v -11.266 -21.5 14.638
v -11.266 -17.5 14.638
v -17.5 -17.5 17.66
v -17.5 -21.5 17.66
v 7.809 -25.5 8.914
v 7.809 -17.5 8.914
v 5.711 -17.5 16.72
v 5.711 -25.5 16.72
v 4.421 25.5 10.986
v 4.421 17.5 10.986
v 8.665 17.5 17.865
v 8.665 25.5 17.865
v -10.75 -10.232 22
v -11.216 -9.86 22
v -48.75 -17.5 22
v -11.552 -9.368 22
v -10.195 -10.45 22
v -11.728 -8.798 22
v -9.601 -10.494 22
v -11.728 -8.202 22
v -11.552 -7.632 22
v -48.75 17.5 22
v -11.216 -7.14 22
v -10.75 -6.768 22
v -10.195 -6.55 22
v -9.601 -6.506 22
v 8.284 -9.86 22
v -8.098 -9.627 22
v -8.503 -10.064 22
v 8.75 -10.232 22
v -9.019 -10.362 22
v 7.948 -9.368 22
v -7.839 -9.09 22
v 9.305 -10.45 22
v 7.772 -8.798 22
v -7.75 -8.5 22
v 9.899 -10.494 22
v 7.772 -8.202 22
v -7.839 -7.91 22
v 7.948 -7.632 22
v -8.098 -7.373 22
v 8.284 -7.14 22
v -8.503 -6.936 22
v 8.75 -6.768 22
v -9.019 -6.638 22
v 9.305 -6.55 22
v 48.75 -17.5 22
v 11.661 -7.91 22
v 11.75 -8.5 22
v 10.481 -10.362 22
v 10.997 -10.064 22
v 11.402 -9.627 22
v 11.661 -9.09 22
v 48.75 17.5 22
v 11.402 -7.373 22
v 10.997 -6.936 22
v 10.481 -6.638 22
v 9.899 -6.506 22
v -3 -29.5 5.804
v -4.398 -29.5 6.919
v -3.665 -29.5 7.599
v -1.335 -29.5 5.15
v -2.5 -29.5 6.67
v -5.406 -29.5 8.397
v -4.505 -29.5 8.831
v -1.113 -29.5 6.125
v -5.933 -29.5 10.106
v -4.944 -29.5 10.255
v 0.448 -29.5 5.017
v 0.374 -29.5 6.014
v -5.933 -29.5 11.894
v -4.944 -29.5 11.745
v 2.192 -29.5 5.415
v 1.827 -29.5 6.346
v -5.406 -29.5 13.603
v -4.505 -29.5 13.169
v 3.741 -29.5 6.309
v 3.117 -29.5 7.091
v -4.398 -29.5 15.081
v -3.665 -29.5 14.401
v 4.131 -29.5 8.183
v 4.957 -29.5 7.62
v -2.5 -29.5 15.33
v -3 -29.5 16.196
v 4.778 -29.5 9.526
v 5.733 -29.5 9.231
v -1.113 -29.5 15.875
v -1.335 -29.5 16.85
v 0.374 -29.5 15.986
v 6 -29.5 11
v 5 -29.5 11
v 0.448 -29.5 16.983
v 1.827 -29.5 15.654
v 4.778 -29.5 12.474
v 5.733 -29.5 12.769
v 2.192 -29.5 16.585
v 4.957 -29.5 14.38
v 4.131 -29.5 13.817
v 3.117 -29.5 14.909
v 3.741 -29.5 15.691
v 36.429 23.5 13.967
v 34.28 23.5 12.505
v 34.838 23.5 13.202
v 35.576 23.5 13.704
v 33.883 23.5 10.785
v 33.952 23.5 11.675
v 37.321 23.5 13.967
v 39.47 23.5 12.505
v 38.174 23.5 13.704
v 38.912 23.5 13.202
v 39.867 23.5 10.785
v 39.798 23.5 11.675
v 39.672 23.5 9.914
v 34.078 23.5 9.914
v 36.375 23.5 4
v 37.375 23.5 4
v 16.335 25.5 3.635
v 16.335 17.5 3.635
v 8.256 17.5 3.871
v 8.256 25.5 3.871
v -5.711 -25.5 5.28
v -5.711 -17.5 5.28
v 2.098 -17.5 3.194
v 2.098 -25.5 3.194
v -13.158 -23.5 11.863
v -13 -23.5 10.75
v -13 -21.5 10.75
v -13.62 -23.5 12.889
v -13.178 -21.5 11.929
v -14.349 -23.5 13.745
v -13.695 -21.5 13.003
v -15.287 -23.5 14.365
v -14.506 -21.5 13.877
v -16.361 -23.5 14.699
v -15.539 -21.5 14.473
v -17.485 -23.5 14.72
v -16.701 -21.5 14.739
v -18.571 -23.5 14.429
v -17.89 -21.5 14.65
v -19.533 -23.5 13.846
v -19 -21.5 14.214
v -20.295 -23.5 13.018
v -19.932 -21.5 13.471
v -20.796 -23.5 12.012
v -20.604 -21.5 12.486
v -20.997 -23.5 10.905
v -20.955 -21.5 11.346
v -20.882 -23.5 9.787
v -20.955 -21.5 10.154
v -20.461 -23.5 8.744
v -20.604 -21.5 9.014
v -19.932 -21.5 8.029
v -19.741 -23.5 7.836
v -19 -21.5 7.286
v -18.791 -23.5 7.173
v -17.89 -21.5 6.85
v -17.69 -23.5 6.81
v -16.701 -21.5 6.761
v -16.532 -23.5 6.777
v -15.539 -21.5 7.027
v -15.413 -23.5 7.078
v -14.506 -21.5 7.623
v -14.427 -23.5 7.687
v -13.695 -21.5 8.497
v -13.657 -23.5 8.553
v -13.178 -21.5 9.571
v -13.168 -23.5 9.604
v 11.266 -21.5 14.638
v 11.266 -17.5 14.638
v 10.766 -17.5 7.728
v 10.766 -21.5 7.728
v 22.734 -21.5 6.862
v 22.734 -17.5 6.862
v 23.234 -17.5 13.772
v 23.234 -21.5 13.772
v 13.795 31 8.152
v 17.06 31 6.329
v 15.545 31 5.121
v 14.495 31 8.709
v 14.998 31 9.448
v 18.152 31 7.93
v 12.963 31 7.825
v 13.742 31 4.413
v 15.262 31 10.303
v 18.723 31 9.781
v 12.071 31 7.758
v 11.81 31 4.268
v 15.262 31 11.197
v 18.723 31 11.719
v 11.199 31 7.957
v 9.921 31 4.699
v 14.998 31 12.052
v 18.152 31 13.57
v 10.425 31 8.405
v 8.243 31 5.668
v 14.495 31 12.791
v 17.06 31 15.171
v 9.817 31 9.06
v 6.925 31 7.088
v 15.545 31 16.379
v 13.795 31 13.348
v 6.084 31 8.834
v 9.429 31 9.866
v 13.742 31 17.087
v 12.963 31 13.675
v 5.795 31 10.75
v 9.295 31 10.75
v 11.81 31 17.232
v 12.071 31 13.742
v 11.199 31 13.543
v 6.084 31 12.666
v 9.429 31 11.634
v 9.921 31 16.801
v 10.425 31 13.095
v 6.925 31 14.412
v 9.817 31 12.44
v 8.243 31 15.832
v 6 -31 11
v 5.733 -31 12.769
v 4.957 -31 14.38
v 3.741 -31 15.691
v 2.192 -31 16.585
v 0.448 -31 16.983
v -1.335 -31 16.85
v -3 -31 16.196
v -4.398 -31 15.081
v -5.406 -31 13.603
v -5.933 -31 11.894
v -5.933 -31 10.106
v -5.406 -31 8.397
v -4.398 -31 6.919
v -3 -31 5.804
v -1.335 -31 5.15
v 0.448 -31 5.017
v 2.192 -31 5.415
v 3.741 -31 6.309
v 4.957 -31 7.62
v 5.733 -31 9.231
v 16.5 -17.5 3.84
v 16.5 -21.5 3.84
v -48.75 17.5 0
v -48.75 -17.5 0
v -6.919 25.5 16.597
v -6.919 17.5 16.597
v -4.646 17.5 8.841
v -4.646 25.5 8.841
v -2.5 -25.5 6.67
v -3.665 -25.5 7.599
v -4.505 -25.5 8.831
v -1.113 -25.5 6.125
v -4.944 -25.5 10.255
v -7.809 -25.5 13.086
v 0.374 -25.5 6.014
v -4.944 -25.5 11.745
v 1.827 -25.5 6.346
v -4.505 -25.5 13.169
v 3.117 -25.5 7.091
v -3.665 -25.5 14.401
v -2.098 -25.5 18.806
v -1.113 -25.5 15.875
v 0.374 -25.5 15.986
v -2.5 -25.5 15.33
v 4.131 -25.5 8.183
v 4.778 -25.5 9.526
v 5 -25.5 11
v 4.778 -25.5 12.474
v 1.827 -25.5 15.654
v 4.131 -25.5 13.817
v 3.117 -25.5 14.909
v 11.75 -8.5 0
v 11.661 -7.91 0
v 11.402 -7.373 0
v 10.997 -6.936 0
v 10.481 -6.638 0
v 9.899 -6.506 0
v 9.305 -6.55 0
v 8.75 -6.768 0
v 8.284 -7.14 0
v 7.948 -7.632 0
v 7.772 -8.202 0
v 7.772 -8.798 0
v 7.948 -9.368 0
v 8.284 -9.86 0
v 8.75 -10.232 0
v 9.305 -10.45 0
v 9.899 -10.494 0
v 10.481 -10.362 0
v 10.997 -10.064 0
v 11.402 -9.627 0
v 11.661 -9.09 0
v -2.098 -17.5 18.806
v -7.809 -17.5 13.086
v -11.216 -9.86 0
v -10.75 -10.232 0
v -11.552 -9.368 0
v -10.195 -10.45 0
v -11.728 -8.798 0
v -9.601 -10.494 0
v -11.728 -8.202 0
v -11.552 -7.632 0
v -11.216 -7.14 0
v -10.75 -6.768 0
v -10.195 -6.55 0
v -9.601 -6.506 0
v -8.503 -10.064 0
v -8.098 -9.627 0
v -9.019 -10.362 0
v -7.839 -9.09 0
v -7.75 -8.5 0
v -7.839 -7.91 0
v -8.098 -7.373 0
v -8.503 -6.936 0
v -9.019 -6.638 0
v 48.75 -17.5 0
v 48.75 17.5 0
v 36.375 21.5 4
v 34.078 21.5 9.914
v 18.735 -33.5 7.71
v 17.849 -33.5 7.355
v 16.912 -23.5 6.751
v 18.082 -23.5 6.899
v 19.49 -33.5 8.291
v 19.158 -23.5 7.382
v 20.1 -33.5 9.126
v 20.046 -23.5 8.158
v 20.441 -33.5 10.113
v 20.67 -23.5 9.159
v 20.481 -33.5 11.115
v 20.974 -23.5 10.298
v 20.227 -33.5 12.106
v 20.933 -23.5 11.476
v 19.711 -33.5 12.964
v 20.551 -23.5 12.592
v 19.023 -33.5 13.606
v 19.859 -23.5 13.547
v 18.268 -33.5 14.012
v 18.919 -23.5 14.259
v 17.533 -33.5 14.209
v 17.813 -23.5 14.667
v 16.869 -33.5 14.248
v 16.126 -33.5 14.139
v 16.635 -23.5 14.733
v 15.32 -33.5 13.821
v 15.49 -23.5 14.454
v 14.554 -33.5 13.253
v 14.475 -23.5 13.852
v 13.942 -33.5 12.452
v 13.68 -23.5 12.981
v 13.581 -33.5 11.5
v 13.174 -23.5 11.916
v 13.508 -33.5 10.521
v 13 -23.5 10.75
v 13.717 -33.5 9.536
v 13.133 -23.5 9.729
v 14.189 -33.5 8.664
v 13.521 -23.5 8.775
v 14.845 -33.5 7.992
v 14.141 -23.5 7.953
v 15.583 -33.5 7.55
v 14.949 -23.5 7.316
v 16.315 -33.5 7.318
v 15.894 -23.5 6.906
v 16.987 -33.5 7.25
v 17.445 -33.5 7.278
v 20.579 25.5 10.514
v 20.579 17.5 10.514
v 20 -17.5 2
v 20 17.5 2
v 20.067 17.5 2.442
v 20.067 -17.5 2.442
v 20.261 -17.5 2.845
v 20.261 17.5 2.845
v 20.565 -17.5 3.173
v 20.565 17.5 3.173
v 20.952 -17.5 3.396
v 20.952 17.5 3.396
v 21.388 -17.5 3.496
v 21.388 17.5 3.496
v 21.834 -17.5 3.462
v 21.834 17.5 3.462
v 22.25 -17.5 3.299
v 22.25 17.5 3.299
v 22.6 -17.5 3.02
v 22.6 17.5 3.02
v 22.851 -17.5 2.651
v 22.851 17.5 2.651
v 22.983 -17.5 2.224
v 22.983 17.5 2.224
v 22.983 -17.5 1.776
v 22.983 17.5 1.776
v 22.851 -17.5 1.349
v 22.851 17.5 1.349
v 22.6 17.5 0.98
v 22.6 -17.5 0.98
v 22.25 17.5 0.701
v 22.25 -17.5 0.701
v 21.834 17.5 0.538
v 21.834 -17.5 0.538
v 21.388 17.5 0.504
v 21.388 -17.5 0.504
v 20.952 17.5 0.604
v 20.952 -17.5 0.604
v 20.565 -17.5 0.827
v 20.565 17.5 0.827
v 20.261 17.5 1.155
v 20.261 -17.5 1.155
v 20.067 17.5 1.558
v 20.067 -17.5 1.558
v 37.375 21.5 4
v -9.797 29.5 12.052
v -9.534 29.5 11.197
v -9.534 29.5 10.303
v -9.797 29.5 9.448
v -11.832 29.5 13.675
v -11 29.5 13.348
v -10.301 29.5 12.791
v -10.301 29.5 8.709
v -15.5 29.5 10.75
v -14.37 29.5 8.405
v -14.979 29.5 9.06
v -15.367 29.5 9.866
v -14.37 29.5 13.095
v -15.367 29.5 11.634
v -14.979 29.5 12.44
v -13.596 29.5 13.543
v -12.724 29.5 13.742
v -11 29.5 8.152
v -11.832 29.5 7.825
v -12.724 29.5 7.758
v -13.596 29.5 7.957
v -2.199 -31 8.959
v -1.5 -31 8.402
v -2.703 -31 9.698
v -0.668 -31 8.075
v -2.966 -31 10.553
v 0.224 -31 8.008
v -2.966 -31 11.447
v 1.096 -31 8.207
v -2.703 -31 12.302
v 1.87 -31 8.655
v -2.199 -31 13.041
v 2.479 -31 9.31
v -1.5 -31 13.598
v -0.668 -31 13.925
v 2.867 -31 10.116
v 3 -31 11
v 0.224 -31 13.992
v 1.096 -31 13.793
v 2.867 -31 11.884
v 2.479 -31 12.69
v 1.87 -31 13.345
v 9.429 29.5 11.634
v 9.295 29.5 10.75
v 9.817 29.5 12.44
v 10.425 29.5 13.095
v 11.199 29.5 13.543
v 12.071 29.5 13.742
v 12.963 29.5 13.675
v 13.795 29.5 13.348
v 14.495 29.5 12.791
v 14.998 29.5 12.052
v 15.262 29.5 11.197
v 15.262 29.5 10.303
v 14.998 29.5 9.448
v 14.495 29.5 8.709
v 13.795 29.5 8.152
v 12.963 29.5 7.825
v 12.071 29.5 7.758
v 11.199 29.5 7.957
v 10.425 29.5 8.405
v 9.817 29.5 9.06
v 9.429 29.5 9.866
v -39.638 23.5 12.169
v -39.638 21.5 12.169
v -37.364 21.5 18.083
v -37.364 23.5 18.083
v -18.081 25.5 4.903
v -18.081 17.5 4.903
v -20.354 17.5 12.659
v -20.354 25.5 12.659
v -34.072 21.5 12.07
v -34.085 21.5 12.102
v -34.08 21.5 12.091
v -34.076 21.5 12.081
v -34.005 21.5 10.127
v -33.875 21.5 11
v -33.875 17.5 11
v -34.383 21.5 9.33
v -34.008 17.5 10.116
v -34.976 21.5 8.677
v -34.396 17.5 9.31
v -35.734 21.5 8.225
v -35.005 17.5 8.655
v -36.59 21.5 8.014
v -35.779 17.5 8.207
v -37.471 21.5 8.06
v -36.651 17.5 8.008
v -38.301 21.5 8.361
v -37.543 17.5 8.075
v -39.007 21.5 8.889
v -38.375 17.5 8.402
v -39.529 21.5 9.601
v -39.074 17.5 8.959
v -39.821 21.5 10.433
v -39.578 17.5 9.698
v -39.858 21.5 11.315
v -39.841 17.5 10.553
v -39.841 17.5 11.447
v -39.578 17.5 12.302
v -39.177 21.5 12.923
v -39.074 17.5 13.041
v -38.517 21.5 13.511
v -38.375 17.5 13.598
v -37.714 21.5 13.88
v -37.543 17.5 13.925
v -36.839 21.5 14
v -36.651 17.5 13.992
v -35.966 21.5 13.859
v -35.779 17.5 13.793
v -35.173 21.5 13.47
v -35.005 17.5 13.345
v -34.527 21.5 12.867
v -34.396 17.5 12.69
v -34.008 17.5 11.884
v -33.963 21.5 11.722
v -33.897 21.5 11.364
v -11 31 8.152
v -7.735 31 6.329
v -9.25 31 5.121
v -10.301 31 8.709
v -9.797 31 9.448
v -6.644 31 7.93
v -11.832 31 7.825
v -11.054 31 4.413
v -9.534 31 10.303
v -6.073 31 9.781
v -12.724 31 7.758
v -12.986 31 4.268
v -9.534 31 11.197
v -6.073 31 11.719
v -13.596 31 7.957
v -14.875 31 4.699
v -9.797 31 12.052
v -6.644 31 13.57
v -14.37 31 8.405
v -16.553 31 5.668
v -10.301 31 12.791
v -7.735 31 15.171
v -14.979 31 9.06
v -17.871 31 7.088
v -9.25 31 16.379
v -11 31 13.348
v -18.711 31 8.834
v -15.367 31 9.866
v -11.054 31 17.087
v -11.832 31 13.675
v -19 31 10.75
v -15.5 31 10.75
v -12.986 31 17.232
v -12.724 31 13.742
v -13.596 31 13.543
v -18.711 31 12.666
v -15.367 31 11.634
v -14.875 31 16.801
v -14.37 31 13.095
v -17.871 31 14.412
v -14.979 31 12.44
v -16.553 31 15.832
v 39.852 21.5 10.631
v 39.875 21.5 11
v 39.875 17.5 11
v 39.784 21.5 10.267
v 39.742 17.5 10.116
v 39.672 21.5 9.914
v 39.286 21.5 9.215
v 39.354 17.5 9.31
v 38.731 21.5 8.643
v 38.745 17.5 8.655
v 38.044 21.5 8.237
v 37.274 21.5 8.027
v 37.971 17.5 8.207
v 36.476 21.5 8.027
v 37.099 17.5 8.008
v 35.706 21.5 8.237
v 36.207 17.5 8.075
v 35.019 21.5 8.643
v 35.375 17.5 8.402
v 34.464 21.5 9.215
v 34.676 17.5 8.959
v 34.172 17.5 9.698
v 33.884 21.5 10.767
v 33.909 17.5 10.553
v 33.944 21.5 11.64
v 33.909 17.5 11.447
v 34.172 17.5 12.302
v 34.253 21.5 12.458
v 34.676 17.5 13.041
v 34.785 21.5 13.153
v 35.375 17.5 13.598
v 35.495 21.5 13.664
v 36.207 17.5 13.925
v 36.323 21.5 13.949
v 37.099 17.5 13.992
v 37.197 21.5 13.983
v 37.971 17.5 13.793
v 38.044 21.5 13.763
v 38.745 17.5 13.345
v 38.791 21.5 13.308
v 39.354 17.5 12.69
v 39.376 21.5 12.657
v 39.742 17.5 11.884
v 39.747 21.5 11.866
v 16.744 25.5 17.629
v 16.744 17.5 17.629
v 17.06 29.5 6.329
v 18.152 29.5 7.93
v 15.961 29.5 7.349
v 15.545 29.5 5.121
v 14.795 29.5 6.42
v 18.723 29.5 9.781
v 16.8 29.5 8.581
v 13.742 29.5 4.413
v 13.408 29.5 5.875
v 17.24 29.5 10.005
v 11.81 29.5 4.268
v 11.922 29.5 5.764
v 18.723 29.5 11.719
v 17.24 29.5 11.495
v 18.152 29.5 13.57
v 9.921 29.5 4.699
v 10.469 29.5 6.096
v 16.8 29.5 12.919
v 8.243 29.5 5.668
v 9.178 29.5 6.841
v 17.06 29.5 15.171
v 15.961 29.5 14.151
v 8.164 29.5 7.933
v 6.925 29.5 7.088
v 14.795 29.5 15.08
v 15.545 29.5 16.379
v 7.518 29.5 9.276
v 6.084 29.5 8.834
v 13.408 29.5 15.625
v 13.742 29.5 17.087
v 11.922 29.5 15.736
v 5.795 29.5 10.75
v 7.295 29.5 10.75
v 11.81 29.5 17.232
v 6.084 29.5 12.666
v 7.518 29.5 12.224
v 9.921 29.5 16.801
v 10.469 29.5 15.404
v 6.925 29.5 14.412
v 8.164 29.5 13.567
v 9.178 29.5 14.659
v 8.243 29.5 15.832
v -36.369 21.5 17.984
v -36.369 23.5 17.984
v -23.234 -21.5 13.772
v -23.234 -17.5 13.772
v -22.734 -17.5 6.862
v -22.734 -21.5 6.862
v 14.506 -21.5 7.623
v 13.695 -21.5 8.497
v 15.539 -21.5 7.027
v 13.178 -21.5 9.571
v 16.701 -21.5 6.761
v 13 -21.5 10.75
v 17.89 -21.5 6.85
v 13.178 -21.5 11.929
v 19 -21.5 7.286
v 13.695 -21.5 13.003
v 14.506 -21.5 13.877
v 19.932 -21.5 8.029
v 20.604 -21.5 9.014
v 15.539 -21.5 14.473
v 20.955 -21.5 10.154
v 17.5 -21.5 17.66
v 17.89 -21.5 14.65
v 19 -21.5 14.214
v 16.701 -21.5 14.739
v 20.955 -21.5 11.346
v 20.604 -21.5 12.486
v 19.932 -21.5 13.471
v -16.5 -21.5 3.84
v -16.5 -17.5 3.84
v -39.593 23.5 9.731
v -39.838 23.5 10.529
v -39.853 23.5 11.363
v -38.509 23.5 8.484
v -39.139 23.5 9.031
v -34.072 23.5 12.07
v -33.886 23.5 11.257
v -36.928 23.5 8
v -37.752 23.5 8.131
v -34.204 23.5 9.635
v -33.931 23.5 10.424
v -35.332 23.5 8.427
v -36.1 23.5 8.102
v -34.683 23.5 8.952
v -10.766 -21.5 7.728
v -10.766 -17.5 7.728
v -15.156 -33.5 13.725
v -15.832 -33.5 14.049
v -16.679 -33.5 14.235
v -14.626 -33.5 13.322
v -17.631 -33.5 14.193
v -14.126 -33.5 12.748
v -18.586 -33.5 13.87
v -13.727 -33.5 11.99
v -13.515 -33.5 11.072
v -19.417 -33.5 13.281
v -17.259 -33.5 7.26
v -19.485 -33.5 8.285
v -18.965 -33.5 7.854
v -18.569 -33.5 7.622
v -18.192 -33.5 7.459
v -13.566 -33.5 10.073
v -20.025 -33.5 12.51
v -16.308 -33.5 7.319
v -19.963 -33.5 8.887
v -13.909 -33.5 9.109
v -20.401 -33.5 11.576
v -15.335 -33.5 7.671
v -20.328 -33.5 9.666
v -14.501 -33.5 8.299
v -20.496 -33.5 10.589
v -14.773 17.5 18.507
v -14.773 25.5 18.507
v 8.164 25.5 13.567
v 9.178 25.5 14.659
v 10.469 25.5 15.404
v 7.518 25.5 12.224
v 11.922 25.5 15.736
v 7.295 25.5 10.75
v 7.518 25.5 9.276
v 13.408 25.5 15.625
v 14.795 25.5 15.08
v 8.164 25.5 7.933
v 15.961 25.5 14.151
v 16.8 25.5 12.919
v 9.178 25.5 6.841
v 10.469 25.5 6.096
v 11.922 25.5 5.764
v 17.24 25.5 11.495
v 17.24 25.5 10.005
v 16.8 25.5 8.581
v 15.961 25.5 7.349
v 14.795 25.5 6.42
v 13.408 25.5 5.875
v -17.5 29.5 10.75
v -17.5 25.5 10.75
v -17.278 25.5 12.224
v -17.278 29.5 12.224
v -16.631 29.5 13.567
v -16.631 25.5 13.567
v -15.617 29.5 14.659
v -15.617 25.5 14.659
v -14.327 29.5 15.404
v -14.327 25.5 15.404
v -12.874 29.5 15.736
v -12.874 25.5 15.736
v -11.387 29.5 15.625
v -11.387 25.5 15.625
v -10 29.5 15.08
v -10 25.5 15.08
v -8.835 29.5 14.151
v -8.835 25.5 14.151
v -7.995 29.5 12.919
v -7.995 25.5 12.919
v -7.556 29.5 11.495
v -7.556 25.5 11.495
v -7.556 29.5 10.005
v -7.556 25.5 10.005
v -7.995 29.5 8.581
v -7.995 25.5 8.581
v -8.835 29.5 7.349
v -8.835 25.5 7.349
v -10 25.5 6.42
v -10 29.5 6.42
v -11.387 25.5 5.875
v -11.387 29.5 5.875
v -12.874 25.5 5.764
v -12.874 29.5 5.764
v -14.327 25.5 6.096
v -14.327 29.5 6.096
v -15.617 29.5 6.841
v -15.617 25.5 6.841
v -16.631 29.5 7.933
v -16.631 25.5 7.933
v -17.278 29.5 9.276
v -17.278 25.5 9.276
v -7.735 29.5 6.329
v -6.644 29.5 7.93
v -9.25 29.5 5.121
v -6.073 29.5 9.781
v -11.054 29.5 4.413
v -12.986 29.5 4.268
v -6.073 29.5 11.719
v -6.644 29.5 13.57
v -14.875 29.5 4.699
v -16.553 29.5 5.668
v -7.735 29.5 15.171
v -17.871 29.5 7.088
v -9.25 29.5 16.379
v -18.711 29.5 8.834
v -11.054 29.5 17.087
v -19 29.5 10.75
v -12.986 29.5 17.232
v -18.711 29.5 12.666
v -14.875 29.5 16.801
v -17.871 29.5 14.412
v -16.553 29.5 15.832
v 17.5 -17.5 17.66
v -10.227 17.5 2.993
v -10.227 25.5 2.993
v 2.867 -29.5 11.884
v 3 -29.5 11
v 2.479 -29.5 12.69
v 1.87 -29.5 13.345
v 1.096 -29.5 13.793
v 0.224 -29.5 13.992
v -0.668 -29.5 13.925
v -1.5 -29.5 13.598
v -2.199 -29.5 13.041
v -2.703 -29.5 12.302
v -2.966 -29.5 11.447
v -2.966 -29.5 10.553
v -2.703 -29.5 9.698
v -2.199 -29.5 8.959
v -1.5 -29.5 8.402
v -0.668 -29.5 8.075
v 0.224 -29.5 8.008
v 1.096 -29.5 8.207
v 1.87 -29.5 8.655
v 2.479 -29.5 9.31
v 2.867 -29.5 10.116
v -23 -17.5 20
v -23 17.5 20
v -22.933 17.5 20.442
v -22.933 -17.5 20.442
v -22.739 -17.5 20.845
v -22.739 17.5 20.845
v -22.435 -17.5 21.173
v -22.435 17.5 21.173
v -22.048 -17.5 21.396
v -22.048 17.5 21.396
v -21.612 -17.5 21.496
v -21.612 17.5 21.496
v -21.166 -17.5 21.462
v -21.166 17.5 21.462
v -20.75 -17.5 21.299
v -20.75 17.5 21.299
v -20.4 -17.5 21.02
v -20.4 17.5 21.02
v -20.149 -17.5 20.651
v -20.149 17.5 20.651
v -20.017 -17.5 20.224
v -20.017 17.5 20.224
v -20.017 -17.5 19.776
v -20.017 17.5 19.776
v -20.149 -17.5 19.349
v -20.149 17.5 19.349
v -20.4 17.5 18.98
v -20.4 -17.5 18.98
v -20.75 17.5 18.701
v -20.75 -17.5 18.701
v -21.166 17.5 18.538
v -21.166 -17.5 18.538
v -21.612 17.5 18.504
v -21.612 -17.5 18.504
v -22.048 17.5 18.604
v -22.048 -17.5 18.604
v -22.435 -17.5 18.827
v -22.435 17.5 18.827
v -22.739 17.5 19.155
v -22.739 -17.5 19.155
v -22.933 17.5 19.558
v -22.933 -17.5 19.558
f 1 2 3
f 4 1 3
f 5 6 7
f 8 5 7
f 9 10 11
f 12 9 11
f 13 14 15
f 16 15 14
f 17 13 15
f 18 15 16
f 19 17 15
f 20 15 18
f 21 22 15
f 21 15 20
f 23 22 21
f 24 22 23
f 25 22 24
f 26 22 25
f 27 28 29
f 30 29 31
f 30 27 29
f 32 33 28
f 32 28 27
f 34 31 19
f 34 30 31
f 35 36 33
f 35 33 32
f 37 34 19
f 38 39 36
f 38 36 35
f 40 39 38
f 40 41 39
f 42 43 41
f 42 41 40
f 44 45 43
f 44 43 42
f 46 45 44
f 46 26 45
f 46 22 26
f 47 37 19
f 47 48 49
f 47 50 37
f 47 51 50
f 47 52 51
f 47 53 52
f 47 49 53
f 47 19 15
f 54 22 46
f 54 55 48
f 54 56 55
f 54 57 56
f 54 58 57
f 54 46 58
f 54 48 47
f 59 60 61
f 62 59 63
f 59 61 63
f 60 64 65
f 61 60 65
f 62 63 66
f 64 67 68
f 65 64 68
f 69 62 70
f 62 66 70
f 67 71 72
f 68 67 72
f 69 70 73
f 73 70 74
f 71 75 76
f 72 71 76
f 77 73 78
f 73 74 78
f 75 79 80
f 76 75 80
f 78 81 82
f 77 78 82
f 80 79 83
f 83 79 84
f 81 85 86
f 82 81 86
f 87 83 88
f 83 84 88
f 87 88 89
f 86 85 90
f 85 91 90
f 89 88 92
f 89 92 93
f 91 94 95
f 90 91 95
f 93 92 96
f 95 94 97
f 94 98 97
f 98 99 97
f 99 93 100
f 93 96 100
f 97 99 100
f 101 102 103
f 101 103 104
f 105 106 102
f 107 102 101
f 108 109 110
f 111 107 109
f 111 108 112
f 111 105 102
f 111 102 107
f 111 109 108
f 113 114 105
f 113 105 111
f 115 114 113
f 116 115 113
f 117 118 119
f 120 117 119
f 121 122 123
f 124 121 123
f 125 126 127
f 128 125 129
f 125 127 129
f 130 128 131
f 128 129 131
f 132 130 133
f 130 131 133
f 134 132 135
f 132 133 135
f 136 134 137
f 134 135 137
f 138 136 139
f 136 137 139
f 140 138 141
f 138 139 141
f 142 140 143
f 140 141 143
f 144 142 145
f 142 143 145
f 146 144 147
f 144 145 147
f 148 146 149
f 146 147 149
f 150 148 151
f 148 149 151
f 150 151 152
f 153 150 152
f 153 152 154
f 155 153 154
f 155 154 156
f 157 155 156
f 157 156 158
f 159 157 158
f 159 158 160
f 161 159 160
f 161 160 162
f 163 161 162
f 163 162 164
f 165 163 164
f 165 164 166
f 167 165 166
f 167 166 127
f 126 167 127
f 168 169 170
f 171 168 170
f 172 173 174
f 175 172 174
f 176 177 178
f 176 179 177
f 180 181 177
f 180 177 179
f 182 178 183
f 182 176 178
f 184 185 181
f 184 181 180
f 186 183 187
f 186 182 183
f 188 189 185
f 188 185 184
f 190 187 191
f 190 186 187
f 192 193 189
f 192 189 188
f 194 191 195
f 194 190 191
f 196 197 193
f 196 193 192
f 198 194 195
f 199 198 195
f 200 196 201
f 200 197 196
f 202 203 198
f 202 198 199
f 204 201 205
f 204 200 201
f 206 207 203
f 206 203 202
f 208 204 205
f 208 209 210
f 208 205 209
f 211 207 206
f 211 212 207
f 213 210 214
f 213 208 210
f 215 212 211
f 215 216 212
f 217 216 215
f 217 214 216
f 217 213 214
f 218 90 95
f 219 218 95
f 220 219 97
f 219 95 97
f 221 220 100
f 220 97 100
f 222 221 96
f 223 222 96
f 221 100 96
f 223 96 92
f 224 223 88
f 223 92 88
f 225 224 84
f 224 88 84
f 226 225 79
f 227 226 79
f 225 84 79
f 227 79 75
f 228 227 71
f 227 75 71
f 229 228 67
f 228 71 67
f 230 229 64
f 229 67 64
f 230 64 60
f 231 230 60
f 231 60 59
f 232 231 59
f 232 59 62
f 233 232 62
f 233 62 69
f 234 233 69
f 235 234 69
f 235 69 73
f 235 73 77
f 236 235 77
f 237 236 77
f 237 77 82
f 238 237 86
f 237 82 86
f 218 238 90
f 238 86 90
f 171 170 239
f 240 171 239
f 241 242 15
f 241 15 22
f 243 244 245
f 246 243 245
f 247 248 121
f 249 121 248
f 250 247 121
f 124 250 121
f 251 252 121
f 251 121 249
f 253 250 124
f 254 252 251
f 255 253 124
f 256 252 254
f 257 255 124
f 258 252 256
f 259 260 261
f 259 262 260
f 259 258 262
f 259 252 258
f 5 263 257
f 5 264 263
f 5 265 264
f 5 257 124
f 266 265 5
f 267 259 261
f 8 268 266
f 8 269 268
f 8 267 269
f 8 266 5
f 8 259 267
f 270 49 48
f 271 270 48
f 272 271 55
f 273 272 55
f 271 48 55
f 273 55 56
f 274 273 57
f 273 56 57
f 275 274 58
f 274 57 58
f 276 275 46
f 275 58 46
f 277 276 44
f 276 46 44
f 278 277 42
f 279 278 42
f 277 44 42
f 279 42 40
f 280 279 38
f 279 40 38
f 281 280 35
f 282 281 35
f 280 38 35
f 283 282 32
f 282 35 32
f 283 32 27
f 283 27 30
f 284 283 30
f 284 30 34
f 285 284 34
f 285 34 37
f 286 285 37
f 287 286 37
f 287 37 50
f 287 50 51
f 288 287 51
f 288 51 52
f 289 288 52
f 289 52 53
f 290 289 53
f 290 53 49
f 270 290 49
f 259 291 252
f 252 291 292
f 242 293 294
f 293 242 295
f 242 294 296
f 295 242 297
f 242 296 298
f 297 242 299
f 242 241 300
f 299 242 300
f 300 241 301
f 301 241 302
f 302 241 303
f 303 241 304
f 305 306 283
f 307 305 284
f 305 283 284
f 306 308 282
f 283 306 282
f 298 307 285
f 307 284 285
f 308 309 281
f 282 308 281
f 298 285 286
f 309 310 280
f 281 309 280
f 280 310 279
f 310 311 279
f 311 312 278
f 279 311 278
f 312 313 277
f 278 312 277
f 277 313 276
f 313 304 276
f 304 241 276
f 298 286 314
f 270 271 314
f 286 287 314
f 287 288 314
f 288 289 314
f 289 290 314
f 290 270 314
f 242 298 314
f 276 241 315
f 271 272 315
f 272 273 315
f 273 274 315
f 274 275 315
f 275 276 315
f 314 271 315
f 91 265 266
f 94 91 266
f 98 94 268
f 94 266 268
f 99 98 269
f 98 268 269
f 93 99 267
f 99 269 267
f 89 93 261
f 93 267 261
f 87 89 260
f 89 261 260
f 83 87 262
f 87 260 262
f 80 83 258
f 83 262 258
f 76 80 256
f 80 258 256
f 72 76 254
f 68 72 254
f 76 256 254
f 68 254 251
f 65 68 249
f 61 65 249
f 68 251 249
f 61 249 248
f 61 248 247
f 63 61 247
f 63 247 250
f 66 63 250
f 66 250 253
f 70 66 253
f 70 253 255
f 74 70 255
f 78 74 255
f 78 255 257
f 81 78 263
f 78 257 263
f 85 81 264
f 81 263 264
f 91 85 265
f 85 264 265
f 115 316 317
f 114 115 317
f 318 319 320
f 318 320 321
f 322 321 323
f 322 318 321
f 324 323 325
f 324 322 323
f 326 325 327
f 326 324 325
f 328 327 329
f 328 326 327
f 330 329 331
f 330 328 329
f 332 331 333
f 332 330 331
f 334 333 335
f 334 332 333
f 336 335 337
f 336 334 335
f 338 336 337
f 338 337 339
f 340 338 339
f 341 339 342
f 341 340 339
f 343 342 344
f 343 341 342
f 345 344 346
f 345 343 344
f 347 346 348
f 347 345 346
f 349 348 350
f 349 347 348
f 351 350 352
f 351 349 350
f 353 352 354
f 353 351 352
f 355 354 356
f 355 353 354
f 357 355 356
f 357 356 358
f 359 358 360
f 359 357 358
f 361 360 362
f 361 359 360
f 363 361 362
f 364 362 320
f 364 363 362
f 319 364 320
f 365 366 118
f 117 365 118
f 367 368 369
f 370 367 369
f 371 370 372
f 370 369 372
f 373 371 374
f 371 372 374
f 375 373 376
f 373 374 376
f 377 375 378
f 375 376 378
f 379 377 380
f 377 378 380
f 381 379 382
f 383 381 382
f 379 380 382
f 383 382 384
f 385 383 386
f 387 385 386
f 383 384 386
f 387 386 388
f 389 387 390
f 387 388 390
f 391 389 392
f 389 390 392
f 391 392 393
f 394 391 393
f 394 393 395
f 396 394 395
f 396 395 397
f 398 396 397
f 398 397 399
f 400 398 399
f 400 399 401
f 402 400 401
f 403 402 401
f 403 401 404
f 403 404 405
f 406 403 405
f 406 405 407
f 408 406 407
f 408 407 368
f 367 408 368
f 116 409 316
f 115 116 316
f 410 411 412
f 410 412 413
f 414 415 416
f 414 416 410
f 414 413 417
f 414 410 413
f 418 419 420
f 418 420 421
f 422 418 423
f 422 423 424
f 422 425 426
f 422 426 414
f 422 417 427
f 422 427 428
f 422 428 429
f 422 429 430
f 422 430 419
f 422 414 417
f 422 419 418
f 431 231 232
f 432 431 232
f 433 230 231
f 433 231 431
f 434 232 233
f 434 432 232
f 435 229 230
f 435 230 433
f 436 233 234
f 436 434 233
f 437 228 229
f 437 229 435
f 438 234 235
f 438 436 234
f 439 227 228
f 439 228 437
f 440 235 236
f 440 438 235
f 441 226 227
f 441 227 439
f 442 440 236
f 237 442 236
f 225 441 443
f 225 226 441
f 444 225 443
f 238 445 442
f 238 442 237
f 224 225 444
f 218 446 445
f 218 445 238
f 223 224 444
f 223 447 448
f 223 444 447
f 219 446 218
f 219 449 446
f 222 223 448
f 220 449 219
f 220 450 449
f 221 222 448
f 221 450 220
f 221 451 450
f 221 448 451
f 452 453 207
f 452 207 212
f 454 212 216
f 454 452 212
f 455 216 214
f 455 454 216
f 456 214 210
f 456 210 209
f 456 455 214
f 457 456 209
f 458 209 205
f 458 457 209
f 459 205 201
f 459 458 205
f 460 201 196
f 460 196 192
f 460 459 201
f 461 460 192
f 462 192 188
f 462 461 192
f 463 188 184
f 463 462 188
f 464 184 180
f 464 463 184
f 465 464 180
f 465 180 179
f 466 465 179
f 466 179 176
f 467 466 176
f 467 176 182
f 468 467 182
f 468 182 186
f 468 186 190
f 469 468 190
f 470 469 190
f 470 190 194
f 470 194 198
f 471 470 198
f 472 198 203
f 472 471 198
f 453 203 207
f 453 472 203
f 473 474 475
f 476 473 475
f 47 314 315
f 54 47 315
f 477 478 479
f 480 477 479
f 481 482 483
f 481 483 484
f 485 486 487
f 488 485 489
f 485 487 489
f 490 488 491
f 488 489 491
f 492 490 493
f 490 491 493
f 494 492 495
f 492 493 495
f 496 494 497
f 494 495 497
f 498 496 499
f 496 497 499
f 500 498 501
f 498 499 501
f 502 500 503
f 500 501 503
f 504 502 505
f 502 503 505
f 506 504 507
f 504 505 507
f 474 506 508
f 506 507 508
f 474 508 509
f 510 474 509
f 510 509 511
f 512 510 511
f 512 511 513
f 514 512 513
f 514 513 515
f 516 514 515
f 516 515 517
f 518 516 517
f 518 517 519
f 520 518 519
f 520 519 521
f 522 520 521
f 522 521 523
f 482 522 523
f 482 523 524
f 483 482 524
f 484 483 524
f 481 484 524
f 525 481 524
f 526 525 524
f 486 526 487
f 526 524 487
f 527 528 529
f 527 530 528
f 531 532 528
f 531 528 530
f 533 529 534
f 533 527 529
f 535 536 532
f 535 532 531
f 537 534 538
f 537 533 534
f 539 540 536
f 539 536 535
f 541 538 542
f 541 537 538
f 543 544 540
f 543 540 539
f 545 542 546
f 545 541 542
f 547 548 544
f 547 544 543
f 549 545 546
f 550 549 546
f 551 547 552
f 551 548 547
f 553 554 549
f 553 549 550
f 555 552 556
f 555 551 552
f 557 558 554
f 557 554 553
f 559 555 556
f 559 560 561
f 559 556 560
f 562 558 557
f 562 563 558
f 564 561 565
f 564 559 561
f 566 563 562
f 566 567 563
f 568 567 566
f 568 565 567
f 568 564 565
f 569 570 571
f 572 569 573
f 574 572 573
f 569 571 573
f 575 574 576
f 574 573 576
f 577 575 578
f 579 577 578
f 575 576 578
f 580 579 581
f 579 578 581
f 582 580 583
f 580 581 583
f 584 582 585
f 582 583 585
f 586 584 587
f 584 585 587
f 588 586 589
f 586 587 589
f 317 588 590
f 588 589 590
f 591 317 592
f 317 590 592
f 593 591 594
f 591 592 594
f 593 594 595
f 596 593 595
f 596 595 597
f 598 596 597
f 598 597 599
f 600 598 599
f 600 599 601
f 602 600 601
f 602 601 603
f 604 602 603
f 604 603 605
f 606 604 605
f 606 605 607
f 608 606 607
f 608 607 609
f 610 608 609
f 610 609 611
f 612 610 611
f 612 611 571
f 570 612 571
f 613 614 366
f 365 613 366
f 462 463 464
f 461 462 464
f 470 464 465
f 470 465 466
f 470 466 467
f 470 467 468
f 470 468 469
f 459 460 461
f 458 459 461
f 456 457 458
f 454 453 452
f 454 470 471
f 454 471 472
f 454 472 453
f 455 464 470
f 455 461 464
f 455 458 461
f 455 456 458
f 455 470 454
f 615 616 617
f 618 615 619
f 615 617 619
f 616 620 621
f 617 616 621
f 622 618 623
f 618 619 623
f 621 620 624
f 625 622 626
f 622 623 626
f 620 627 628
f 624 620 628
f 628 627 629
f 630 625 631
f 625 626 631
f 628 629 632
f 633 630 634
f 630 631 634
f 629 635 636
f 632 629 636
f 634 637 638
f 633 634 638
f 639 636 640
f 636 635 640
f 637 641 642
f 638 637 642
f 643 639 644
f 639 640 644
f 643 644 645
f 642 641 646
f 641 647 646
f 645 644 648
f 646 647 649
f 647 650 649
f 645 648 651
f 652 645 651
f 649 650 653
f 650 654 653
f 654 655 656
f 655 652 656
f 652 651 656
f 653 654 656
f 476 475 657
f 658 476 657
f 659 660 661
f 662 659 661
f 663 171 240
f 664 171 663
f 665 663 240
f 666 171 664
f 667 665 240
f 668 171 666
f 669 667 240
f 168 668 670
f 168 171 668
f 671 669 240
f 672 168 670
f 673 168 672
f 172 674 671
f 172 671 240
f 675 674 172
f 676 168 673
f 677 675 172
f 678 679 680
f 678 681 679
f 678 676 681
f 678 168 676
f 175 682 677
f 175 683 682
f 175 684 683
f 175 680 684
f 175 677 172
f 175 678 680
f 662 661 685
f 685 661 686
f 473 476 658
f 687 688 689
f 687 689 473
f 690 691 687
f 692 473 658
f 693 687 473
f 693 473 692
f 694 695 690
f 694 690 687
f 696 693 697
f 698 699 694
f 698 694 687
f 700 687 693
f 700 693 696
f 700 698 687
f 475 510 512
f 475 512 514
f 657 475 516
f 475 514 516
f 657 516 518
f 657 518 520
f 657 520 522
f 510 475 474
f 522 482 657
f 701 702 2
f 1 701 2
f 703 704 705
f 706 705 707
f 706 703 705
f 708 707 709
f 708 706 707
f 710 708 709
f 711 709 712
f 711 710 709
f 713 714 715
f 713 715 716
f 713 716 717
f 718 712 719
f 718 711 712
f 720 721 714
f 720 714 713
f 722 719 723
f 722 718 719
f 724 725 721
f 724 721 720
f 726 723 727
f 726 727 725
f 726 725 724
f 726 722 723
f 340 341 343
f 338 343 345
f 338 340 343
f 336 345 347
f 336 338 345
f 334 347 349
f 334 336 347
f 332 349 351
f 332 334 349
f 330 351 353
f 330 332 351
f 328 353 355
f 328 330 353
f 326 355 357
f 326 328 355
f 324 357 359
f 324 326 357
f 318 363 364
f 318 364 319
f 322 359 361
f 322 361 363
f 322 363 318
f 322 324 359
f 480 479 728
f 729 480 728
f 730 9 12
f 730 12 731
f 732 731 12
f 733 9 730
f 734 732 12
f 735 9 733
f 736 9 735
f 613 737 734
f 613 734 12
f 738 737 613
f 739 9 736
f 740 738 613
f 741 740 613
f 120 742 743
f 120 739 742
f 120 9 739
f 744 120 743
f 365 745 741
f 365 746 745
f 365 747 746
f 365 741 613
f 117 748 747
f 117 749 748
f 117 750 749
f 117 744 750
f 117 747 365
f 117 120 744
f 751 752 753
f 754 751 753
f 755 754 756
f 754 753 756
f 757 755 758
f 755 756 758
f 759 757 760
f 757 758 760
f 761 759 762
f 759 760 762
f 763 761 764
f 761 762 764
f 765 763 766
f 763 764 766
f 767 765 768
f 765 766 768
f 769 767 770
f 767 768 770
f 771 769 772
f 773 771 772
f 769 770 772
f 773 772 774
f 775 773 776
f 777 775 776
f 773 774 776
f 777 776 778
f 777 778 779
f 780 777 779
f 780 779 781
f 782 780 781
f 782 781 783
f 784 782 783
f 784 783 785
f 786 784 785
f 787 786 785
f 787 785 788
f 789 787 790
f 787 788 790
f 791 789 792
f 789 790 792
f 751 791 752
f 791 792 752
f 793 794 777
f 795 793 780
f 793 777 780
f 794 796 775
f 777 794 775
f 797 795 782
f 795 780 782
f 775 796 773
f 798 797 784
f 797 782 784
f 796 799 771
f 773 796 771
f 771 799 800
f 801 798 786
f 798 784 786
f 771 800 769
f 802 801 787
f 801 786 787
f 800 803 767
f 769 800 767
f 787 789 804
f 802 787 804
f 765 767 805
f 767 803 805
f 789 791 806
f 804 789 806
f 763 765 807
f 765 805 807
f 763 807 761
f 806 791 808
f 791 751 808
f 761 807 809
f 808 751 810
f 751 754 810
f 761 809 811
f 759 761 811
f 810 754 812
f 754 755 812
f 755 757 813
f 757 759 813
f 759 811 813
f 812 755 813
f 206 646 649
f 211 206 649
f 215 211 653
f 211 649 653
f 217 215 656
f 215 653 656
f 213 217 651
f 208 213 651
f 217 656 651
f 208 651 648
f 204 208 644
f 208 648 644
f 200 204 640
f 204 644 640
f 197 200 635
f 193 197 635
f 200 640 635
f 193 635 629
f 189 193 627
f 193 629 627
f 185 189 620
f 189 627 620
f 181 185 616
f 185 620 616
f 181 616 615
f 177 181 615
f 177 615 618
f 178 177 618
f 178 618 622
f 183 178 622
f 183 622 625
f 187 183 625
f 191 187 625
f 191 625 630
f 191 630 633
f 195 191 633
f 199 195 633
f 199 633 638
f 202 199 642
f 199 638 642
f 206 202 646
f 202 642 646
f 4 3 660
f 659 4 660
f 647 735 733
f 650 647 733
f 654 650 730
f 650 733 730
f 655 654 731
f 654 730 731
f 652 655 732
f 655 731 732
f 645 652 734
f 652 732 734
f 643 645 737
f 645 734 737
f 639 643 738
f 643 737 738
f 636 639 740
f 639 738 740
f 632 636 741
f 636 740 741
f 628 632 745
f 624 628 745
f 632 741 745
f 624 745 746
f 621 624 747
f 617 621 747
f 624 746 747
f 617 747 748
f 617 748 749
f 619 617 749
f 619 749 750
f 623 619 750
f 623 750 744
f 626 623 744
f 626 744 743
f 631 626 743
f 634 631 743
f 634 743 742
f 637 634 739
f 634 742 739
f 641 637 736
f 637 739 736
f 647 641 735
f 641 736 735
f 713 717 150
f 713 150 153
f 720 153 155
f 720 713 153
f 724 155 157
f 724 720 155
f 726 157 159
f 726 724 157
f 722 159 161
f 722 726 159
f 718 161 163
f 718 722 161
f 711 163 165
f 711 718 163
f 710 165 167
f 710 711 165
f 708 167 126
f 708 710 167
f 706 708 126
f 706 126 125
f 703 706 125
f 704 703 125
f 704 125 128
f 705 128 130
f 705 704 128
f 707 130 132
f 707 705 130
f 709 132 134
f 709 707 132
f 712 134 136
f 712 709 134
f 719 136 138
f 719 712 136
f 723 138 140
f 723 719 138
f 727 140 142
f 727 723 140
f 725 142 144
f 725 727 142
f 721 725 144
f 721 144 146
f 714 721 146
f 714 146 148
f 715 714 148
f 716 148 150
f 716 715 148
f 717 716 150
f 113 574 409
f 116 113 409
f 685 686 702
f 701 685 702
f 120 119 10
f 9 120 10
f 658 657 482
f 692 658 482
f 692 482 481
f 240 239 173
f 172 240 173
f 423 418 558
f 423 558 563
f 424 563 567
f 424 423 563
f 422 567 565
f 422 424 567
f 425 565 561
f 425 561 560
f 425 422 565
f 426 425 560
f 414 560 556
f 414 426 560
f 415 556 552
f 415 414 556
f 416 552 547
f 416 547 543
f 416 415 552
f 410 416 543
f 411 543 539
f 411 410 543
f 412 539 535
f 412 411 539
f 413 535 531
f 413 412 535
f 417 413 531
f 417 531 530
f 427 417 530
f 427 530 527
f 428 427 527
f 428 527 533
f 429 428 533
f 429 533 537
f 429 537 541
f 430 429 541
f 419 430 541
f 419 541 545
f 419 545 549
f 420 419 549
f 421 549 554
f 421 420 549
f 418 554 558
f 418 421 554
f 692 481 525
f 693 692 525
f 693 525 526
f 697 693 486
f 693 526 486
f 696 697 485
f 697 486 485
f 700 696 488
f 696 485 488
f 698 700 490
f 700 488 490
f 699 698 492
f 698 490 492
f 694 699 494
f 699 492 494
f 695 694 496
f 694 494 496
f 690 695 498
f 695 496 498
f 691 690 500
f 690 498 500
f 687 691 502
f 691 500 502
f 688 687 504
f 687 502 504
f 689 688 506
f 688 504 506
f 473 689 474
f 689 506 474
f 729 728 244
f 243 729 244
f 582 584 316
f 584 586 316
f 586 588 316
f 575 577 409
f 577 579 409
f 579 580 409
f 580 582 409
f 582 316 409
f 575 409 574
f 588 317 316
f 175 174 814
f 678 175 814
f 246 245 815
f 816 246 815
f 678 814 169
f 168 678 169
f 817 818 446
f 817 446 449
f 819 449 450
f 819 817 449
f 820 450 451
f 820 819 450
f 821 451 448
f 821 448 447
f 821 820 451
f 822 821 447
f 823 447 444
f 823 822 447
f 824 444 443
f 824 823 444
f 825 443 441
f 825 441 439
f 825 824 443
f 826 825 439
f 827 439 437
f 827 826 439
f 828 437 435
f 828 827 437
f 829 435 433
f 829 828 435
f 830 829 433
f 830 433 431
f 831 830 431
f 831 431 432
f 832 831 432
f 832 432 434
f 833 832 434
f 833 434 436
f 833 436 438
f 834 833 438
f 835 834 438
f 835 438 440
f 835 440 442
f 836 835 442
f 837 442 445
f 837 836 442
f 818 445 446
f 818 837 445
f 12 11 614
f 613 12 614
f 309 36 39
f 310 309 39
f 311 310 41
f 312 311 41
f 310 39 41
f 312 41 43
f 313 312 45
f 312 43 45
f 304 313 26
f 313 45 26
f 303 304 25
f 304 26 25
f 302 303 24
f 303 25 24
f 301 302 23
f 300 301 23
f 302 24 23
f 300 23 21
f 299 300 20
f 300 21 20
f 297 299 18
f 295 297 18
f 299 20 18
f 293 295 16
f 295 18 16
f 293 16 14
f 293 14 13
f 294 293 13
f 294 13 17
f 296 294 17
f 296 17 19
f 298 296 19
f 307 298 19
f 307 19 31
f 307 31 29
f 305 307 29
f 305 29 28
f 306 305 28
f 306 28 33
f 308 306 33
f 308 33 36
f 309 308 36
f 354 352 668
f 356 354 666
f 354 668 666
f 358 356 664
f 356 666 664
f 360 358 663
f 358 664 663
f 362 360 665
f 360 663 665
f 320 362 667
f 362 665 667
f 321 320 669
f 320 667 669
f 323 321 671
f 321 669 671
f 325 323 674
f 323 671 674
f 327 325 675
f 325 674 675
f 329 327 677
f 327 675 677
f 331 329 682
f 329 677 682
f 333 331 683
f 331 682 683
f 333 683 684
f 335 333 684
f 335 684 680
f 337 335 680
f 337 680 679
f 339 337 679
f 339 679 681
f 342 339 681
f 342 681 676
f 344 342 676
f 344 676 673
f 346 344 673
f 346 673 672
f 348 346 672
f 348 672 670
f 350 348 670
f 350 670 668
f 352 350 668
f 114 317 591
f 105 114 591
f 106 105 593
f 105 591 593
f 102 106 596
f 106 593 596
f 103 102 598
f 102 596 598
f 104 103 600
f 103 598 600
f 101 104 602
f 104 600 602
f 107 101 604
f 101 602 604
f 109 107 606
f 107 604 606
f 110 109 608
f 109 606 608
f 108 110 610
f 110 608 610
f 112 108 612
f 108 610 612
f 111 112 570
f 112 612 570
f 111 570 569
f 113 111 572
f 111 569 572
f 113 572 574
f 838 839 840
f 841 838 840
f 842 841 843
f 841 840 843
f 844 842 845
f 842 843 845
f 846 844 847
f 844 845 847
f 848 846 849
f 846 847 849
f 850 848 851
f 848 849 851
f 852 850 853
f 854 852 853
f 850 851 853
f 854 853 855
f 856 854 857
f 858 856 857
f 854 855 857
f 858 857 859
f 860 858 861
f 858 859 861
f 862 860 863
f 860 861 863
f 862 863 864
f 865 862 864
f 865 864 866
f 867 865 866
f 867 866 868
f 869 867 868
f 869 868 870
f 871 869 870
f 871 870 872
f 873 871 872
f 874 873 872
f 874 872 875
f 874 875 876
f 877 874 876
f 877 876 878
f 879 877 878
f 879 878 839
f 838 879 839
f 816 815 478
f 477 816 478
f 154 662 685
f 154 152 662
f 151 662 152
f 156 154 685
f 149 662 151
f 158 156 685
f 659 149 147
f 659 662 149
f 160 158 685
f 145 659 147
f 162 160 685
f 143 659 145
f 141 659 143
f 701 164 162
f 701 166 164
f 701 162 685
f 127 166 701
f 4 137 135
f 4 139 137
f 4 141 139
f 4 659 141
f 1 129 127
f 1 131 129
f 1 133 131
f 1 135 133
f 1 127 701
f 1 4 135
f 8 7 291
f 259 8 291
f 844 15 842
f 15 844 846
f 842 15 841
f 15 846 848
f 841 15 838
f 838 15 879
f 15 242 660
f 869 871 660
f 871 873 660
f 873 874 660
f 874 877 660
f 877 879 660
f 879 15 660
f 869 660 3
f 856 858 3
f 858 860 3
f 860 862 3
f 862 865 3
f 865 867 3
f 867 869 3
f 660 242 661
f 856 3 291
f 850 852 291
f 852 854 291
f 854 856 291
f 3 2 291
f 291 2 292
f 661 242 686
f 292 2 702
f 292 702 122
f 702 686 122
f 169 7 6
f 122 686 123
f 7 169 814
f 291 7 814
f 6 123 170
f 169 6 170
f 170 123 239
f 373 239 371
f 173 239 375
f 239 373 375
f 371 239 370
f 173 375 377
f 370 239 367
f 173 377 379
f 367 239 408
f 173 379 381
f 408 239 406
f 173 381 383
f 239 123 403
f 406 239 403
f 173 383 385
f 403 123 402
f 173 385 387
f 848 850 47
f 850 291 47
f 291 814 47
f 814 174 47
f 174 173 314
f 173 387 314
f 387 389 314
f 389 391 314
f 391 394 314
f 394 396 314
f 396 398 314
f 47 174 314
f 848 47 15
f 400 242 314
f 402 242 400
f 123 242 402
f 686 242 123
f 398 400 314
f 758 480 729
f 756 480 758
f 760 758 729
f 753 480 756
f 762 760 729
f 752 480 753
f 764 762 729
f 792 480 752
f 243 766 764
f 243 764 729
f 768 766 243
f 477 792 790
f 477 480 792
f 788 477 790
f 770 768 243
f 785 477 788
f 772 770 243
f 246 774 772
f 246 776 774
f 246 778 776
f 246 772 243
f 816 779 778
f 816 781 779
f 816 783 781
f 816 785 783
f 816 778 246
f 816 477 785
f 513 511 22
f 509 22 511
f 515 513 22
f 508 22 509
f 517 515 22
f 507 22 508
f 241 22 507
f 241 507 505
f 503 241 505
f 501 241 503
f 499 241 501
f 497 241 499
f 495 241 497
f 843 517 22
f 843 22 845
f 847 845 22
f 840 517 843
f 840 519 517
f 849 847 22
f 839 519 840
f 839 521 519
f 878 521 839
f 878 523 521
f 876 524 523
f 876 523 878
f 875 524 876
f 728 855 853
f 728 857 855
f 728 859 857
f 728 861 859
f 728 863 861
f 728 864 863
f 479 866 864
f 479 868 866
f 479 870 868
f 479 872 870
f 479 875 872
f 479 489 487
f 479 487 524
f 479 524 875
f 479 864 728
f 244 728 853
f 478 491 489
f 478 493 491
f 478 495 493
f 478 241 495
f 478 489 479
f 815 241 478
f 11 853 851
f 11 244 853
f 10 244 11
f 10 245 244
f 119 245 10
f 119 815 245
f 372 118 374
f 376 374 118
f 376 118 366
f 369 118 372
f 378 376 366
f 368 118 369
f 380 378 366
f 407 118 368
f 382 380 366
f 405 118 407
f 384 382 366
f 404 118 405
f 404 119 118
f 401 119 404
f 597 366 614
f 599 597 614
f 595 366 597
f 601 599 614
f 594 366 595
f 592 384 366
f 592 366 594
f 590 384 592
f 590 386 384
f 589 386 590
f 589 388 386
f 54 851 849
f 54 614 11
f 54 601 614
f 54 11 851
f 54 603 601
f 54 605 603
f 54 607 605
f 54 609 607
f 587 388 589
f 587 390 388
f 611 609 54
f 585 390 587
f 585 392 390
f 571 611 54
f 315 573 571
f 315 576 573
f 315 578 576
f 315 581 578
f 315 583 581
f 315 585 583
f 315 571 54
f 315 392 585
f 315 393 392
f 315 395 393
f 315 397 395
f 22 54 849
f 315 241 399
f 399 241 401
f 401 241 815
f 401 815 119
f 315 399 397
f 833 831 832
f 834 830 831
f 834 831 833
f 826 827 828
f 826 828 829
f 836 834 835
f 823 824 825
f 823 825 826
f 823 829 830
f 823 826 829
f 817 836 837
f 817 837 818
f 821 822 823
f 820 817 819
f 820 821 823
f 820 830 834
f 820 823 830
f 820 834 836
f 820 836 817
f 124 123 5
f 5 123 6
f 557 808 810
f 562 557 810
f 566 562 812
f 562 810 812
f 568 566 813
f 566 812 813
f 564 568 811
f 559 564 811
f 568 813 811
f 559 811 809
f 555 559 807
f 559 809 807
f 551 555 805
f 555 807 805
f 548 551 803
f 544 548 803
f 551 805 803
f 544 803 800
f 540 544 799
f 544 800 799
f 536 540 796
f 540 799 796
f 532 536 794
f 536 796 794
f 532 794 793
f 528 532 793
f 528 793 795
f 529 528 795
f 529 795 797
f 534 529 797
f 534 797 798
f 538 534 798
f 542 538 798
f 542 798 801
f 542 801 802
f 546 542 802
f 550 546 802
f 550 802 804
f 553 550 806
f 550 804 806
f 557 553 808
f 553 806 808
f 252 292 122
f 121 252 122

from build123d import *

# Parameters (mm, degrees)
SKETCH1_W            = 97.5
SKETCH1_H            = 35
BOSS_EXTRUDE1_DEPTH  = 22
SKETCH2_R            = 3
BOSS_EXTRUDE2_DEPTH  = 4
BOSS_EXTRUDE3_DEPTH  = 2
BOSS_EXTRUDE4_DEPTH  = 8
SKETCH6_R            = 5
BOSS_EXTRUDE5_DEPTH  = 4
SKETCH7_R            = 6.5
SKETCH7_R_2          = 3
BOSS_EXTRUDE6_DEPTH  = 1.5
BOSS_EXTRUDE8_DEPTH  = 8
BOSS_EXTRUDE9_DEPTH  = 4
SKETCH14_R           = 4
BOSS_EXTRUDE10_DEPTH = 2
SKETCH20_R           = 5
BOSS_EXTRUDE11_DEPTH = 4
SKETCH21_R           = 6
SKETCH21_R_2         = 3
BOSS_EXTRUDE12_DEPTH = 1.5
SKETCH22_R           = 2
CUT_EXTRUDE1_DEPTH   = 28.5
SKETCH25_R           = 1.5
CUT_EXTRUDE3_DEPTH   = 39


with BuildPart() as part:
    # Sketch1 → Boss-Extrude1 (new body)
    with BuildSketch(Plane.XY):
        Rectangle(SKETCH1_W, SKETCH1_H)
    extrude(amount=BOSS_EXTRUDE1_DEPTH)

    # Sketch2 → Boss-Extrude2 (add)
    with BuildSketch(Plane(origin=(0, 17.5, 0), x_dir=(1, 0, 0), z_dir=(0, 1, 0))):
        with Locations((-36.875, -11)):
            Circle(SKETCH2_R)
        with Locations((36.875, -11)):
            Circle(SKETCH2_R)
    extrude(amount=BOSS_EXTRUDE2_DEPTH)

    # Sketch3 → Boss-Extrude3 (add)
    with BuildSketch(Plane(origin=(0, 21.5, 0), x_dir=(1, 0, 0), z_dir=(0, 1, 0))):
        with BuildLine():
            Line((37.375, -4), (36.375, -4))
            Line((36.375, -4), (34.078450474, -9.914039252))
            ThreePointArc((34.078450474, -9.914039252), (36.875, -14), (39.671549526, -9.914039252))
            Line((39.671549526, -9.914039252), (37.375, -4))
        make_face()
        with BuildLine():
            Line((-37.364008965, -18.083081838), (-36.368911019, -17.984187559))
            Line((-36.368911019, -17.984187559), (-34.072361493, -12.070148307))
            ThreePointArc((-34.072361493, -12.070148307), (-36.928299188, -8.000473505), (-39.637849875, -12.169042586))
            Line((-39.637849875, -12.169042586), (-37.364008965, -18.083081838))
        make_face()
    extrude(amount=BOSS_EXTRUDE3_DEPTH)

    # Sketch4 → Boss-Extrude4 (add)
    with BuildSketch(Plane(origin=(0, 17.5, 0), x_dir=(1, 0, 0), z_dir=(0, 1, 0))):
        Polygon((-18.080730298, -4.902882533), (-20.354117415, -12.659495476), (-14.773387117, -18.506612943), (-6.919269702, -16.597117467), (-4.645882585, -8.840504524), (-10.226612883, -2.993387057), align=None)
        Polygon((8.255747213, -3.871071914), (4.420547133, -10.98616669), (8.66479992, -17.865094776), (16.744252787, -17.628928086), (20.579452867, -10.51383331), (16.33520008, -3.634905224), align=None)
    extrude(amount=BOSS_EXTRUDE4_DEPTH)

    # Sketch6 → Boss-Extrude5 (add)
    with BuildSketch(Plane(origin=(0, 25.5, 0), x_dir=(1, 0, 0), z_dir=(0, 1, 0))):
        with Locations(Location((-12.5, -10.75, 0), (0, 0, 180))):
            Circle(SKETCH6_R)
        with Locations(Location((12.295473647, -10.75, 0), (0, 0, 180))):
            Circle(SKETCH6_R)
    extrude(amount=BOSS_EXTRUDE5_DEPTH)

    # Sketch7 → Boss-Extrude6 (add)
    # profile 1 of 2: a face of its own
    with BuildSketch(Plane(origin=(0, 29.5, 0), x_dir=(1, 0, 0), z_dir=(0, 1, 0))):
        with Locations(Location((-12.5, -10.75, 0), (0, 0, 180))):
            Circle(SKETCH7_R)
        with Locations(Location((-12.5, -10.75, 0), (0, 0, 180))):
            Circle(SKETCH7_R_2, mode=Mode.SUBTRACT)
    # profile 2 of 2: a face of its own
    with BuildSketch(Plane(origin=(0, 29.5, 0), x_dir=(1, 0, 0), z_dir=(0, 1, 0))):
        with Locations(Location((12.295473647, -10.75, 0), (0, 0, 180))):
            Circle(SKETCH7_R)
        with Locations(Location((12.295473647, -10.75, 0), (0, 0, 180))):
            Circle(SKETCH7_R_2, mode=Mode.SUBTRACT)
    extrude(amount=BOSS_EXTRUDE6_DEPTH)

    # Sketch9 → Boss-Extrude8 (add)
    with BuildSketch(Plane.XZ.offset(17.5)):
        Polygon((-7.809183897, 13.085660615), (-5.710827024, 5.27987867), (2.098356873, 3.194218055), (7.809183897, 8.914339385), (5.710827024, 16.72012133), (-2.098356873, 18.805781945), align=None)
    extrude(amount=BOSS_EXTRUDE8_DEPTH)

    # Sketch13 → Boss-Extrude9 (add)
    with BuildSketch(Plane.XZ.offset(17.5)):
        Polygon((-22.734354602, 6.861918558), (-16.5, 3.839862519), (-10.765645398, 7.727943962), (-11.265645398, 14.638081442), (-17.5, 17.660137481), (-23.234354602, 13.772056038), align=None)
        Polygon((17.5, 17.660137481), (11.265645398, 14.638081442), (10.765645398, 7.727943962), (16.5, 3.839862519), (22.734354602, 6.861918558), (23.234354602, 13.772056038), align=None)
    extrude(amount=BOSS_EXTRUDE9_DEPTH)

    # Sketch14 → Boss-Extrude10 (add)
    with BuildSketch(Plane.XZ.offset(21.5)):
        with Locations((-17, 10.75)):
            Circle(SKETCH14_R)
        with Locations(Location((17, 10.75, 0), (0, 0, 180))):
            Circle(SKETCH14_R)
    extrude(amount=BOSS_EXTRUDE10_DEPTH)

    # Loft1: read off the stored shape, not the designer's step
    # Loft1: loft between two sections, ruled curve by curve
    loft1_from = [
        Edge.make_bspline([(-20.460745722, -23.5, 8.744198652), (-16.449143026, -23.5, 1.822707208), (-9.527651582, -23.5, 5.834309904), (-13.539254278, -23.5, 12.755801348), (-17.550856974, -23.5, 19.677292792), (-24.472348418, -23.5, 15.665690096), (-20.460745722, -23.5, 8.744198652)], [0, 0, 0, 0, 0.5, 0.5, 0.5, 1, 1, 1, 1], 3, [1, 0.333333333, 0.333333333, 1, 0.333333333, 0.333333333, 1]),
    ]
    loft1_to = [
        Edge.make_bspline([(-18.191787926, -33.5, 7.459157928), (-11.610103782, -33.5, 5.075582077), (-9.226527931, -33.5, 11.65726622), (-15.808212074, -33.5, 14.040842072), (-22.389896218, -33.5, 16.424417923), (-24.773472069, -33.5, 9.84273378), (-18.191787926, -33.5, 7.459157928)], [0, 0, 0, 0, 0.5, 0.5, 0.5, 1, 1, 1, 1], 3, [1, 0.333333333, 0.333333333, 1, 0.333333333, 0.333333333, 1]),
    ]
    loft1 = Solid(Shell([*[Face.make_surface_from_curves(loft1_from[k], loft1_to[k]) for k in range(1)], Face(Wire(loft1_from)), Face(Wire(loft1_to))]))
    add(loft1)

    # Loft4: read off the stored shape, not the designer's step
    # Loft4: loft between two sections, ruled curve by curve
    loft4_from = [
        Edge.make_bspline([(16.912042496, -23.5, 6.750967182), (24.910108131, -23.5, 6.575052174), (25.08602314, -23.5, 14.573117809), (17.087957504, -23.5, 14.749032818), (9.089891869, -23.5, 14.924947826), (8.91397686, -23.5, 6.926882191), (16.912042496, -23.5, 6.750967182)], [0, 0, 0, 0, 0.5, 0.5, 0.5, 1, 1, 1, 1], 3, [1, 0.333333333, 0.333333333, 1, 0.333333333, 0.333333333, 1]),
    ]
    loft4_to = [
        Edge.make_bspline([(17.849097308, -33.5, 7.354556912), (24.639983483, -33.5, 9.052751528), (22.941788868, -33.5, 15.843637703), (16.150902692, -33.5, 14.145443088), (9.360016517, -33.5, 12.447248472), (11.058211132, -33.5, 5.656362297), (17.849097308, -33.5, 7.354556912)], [0, 0, 0, 0, 0.5, 0.5, 0.5, 1, 1, 1, 1], 3, [1, 0.333333333, 0.333333333, 1, 0.333333333, 0.333333333, 1]),
    ]
    loft4 = Solid(Shell([*[Face.make_surface_from_curves(loft4_from[k], loft4_to[k]) for k in range(1)], Face(Wire(loft4_from)), Face(Wire(loft4_to))]))
    add(loft4)

    # Sketch20 → Boss-Extrude11 (add)
    with BuildSketch(Plane.XZ.offset(25.5)):
        with Locations((0, 11)):
            Circle(SKETCH20_R)
    extrude(amount=BOSS_EXTRUDE11_DEPTH)

    # Sketch21 → Boss-Extrude12 (add)
    with BuildSketch(Plane(origin=(0, -29.5, 0), x_dir=(-1, 0, 0), z_dir=(0, -1, 0))):
        with Locations(Location((0, -11, 0), (0, 0, 180))):
            Circle(SKETCH21_R)
        with Locations(Location((0, -11, 0), (0, 0, 180))):
            Circle(SKETCH21_R_2, mode=Mode.SUBTRACT)
    extrude(amount=BOSS_EXTRUDE12_DEPTH)

    # Sketch22 → Cut-Extrude1 (cut)
    with BuildSketch(Plane.XY.offset(22)):
        with Locations((-9.75, -8.5)):
            Circle(SKETCH22_R)
        with Locations((9.75, -8.5)):
            Circle(SKETCH22_R)
    extrude(amount=-CUT_EXTRUDE1_DEPTH, mode=Mode.SUBTRACT)

    # Sketch25 → Cut-Extrude3 (cut)
    with BuildSketch(Plane(origin=(0, 17.5, 0), x_dir=(1, 0, 0), z_dir=(0, 1, 0))):
        with Locations(Location((-21.5, -20, 0), (0, 0, 180))):
            Circle(SKETCH25_R)
        with Locations(Location((21.5, -2, 0), (0, 0, 180))):
            Circle(SKETCH25_R)
    extrude(amount=-CUT_EXTRUDE3_DEPTH, mode=Mode.SUBTRACT)


solid = part.part
